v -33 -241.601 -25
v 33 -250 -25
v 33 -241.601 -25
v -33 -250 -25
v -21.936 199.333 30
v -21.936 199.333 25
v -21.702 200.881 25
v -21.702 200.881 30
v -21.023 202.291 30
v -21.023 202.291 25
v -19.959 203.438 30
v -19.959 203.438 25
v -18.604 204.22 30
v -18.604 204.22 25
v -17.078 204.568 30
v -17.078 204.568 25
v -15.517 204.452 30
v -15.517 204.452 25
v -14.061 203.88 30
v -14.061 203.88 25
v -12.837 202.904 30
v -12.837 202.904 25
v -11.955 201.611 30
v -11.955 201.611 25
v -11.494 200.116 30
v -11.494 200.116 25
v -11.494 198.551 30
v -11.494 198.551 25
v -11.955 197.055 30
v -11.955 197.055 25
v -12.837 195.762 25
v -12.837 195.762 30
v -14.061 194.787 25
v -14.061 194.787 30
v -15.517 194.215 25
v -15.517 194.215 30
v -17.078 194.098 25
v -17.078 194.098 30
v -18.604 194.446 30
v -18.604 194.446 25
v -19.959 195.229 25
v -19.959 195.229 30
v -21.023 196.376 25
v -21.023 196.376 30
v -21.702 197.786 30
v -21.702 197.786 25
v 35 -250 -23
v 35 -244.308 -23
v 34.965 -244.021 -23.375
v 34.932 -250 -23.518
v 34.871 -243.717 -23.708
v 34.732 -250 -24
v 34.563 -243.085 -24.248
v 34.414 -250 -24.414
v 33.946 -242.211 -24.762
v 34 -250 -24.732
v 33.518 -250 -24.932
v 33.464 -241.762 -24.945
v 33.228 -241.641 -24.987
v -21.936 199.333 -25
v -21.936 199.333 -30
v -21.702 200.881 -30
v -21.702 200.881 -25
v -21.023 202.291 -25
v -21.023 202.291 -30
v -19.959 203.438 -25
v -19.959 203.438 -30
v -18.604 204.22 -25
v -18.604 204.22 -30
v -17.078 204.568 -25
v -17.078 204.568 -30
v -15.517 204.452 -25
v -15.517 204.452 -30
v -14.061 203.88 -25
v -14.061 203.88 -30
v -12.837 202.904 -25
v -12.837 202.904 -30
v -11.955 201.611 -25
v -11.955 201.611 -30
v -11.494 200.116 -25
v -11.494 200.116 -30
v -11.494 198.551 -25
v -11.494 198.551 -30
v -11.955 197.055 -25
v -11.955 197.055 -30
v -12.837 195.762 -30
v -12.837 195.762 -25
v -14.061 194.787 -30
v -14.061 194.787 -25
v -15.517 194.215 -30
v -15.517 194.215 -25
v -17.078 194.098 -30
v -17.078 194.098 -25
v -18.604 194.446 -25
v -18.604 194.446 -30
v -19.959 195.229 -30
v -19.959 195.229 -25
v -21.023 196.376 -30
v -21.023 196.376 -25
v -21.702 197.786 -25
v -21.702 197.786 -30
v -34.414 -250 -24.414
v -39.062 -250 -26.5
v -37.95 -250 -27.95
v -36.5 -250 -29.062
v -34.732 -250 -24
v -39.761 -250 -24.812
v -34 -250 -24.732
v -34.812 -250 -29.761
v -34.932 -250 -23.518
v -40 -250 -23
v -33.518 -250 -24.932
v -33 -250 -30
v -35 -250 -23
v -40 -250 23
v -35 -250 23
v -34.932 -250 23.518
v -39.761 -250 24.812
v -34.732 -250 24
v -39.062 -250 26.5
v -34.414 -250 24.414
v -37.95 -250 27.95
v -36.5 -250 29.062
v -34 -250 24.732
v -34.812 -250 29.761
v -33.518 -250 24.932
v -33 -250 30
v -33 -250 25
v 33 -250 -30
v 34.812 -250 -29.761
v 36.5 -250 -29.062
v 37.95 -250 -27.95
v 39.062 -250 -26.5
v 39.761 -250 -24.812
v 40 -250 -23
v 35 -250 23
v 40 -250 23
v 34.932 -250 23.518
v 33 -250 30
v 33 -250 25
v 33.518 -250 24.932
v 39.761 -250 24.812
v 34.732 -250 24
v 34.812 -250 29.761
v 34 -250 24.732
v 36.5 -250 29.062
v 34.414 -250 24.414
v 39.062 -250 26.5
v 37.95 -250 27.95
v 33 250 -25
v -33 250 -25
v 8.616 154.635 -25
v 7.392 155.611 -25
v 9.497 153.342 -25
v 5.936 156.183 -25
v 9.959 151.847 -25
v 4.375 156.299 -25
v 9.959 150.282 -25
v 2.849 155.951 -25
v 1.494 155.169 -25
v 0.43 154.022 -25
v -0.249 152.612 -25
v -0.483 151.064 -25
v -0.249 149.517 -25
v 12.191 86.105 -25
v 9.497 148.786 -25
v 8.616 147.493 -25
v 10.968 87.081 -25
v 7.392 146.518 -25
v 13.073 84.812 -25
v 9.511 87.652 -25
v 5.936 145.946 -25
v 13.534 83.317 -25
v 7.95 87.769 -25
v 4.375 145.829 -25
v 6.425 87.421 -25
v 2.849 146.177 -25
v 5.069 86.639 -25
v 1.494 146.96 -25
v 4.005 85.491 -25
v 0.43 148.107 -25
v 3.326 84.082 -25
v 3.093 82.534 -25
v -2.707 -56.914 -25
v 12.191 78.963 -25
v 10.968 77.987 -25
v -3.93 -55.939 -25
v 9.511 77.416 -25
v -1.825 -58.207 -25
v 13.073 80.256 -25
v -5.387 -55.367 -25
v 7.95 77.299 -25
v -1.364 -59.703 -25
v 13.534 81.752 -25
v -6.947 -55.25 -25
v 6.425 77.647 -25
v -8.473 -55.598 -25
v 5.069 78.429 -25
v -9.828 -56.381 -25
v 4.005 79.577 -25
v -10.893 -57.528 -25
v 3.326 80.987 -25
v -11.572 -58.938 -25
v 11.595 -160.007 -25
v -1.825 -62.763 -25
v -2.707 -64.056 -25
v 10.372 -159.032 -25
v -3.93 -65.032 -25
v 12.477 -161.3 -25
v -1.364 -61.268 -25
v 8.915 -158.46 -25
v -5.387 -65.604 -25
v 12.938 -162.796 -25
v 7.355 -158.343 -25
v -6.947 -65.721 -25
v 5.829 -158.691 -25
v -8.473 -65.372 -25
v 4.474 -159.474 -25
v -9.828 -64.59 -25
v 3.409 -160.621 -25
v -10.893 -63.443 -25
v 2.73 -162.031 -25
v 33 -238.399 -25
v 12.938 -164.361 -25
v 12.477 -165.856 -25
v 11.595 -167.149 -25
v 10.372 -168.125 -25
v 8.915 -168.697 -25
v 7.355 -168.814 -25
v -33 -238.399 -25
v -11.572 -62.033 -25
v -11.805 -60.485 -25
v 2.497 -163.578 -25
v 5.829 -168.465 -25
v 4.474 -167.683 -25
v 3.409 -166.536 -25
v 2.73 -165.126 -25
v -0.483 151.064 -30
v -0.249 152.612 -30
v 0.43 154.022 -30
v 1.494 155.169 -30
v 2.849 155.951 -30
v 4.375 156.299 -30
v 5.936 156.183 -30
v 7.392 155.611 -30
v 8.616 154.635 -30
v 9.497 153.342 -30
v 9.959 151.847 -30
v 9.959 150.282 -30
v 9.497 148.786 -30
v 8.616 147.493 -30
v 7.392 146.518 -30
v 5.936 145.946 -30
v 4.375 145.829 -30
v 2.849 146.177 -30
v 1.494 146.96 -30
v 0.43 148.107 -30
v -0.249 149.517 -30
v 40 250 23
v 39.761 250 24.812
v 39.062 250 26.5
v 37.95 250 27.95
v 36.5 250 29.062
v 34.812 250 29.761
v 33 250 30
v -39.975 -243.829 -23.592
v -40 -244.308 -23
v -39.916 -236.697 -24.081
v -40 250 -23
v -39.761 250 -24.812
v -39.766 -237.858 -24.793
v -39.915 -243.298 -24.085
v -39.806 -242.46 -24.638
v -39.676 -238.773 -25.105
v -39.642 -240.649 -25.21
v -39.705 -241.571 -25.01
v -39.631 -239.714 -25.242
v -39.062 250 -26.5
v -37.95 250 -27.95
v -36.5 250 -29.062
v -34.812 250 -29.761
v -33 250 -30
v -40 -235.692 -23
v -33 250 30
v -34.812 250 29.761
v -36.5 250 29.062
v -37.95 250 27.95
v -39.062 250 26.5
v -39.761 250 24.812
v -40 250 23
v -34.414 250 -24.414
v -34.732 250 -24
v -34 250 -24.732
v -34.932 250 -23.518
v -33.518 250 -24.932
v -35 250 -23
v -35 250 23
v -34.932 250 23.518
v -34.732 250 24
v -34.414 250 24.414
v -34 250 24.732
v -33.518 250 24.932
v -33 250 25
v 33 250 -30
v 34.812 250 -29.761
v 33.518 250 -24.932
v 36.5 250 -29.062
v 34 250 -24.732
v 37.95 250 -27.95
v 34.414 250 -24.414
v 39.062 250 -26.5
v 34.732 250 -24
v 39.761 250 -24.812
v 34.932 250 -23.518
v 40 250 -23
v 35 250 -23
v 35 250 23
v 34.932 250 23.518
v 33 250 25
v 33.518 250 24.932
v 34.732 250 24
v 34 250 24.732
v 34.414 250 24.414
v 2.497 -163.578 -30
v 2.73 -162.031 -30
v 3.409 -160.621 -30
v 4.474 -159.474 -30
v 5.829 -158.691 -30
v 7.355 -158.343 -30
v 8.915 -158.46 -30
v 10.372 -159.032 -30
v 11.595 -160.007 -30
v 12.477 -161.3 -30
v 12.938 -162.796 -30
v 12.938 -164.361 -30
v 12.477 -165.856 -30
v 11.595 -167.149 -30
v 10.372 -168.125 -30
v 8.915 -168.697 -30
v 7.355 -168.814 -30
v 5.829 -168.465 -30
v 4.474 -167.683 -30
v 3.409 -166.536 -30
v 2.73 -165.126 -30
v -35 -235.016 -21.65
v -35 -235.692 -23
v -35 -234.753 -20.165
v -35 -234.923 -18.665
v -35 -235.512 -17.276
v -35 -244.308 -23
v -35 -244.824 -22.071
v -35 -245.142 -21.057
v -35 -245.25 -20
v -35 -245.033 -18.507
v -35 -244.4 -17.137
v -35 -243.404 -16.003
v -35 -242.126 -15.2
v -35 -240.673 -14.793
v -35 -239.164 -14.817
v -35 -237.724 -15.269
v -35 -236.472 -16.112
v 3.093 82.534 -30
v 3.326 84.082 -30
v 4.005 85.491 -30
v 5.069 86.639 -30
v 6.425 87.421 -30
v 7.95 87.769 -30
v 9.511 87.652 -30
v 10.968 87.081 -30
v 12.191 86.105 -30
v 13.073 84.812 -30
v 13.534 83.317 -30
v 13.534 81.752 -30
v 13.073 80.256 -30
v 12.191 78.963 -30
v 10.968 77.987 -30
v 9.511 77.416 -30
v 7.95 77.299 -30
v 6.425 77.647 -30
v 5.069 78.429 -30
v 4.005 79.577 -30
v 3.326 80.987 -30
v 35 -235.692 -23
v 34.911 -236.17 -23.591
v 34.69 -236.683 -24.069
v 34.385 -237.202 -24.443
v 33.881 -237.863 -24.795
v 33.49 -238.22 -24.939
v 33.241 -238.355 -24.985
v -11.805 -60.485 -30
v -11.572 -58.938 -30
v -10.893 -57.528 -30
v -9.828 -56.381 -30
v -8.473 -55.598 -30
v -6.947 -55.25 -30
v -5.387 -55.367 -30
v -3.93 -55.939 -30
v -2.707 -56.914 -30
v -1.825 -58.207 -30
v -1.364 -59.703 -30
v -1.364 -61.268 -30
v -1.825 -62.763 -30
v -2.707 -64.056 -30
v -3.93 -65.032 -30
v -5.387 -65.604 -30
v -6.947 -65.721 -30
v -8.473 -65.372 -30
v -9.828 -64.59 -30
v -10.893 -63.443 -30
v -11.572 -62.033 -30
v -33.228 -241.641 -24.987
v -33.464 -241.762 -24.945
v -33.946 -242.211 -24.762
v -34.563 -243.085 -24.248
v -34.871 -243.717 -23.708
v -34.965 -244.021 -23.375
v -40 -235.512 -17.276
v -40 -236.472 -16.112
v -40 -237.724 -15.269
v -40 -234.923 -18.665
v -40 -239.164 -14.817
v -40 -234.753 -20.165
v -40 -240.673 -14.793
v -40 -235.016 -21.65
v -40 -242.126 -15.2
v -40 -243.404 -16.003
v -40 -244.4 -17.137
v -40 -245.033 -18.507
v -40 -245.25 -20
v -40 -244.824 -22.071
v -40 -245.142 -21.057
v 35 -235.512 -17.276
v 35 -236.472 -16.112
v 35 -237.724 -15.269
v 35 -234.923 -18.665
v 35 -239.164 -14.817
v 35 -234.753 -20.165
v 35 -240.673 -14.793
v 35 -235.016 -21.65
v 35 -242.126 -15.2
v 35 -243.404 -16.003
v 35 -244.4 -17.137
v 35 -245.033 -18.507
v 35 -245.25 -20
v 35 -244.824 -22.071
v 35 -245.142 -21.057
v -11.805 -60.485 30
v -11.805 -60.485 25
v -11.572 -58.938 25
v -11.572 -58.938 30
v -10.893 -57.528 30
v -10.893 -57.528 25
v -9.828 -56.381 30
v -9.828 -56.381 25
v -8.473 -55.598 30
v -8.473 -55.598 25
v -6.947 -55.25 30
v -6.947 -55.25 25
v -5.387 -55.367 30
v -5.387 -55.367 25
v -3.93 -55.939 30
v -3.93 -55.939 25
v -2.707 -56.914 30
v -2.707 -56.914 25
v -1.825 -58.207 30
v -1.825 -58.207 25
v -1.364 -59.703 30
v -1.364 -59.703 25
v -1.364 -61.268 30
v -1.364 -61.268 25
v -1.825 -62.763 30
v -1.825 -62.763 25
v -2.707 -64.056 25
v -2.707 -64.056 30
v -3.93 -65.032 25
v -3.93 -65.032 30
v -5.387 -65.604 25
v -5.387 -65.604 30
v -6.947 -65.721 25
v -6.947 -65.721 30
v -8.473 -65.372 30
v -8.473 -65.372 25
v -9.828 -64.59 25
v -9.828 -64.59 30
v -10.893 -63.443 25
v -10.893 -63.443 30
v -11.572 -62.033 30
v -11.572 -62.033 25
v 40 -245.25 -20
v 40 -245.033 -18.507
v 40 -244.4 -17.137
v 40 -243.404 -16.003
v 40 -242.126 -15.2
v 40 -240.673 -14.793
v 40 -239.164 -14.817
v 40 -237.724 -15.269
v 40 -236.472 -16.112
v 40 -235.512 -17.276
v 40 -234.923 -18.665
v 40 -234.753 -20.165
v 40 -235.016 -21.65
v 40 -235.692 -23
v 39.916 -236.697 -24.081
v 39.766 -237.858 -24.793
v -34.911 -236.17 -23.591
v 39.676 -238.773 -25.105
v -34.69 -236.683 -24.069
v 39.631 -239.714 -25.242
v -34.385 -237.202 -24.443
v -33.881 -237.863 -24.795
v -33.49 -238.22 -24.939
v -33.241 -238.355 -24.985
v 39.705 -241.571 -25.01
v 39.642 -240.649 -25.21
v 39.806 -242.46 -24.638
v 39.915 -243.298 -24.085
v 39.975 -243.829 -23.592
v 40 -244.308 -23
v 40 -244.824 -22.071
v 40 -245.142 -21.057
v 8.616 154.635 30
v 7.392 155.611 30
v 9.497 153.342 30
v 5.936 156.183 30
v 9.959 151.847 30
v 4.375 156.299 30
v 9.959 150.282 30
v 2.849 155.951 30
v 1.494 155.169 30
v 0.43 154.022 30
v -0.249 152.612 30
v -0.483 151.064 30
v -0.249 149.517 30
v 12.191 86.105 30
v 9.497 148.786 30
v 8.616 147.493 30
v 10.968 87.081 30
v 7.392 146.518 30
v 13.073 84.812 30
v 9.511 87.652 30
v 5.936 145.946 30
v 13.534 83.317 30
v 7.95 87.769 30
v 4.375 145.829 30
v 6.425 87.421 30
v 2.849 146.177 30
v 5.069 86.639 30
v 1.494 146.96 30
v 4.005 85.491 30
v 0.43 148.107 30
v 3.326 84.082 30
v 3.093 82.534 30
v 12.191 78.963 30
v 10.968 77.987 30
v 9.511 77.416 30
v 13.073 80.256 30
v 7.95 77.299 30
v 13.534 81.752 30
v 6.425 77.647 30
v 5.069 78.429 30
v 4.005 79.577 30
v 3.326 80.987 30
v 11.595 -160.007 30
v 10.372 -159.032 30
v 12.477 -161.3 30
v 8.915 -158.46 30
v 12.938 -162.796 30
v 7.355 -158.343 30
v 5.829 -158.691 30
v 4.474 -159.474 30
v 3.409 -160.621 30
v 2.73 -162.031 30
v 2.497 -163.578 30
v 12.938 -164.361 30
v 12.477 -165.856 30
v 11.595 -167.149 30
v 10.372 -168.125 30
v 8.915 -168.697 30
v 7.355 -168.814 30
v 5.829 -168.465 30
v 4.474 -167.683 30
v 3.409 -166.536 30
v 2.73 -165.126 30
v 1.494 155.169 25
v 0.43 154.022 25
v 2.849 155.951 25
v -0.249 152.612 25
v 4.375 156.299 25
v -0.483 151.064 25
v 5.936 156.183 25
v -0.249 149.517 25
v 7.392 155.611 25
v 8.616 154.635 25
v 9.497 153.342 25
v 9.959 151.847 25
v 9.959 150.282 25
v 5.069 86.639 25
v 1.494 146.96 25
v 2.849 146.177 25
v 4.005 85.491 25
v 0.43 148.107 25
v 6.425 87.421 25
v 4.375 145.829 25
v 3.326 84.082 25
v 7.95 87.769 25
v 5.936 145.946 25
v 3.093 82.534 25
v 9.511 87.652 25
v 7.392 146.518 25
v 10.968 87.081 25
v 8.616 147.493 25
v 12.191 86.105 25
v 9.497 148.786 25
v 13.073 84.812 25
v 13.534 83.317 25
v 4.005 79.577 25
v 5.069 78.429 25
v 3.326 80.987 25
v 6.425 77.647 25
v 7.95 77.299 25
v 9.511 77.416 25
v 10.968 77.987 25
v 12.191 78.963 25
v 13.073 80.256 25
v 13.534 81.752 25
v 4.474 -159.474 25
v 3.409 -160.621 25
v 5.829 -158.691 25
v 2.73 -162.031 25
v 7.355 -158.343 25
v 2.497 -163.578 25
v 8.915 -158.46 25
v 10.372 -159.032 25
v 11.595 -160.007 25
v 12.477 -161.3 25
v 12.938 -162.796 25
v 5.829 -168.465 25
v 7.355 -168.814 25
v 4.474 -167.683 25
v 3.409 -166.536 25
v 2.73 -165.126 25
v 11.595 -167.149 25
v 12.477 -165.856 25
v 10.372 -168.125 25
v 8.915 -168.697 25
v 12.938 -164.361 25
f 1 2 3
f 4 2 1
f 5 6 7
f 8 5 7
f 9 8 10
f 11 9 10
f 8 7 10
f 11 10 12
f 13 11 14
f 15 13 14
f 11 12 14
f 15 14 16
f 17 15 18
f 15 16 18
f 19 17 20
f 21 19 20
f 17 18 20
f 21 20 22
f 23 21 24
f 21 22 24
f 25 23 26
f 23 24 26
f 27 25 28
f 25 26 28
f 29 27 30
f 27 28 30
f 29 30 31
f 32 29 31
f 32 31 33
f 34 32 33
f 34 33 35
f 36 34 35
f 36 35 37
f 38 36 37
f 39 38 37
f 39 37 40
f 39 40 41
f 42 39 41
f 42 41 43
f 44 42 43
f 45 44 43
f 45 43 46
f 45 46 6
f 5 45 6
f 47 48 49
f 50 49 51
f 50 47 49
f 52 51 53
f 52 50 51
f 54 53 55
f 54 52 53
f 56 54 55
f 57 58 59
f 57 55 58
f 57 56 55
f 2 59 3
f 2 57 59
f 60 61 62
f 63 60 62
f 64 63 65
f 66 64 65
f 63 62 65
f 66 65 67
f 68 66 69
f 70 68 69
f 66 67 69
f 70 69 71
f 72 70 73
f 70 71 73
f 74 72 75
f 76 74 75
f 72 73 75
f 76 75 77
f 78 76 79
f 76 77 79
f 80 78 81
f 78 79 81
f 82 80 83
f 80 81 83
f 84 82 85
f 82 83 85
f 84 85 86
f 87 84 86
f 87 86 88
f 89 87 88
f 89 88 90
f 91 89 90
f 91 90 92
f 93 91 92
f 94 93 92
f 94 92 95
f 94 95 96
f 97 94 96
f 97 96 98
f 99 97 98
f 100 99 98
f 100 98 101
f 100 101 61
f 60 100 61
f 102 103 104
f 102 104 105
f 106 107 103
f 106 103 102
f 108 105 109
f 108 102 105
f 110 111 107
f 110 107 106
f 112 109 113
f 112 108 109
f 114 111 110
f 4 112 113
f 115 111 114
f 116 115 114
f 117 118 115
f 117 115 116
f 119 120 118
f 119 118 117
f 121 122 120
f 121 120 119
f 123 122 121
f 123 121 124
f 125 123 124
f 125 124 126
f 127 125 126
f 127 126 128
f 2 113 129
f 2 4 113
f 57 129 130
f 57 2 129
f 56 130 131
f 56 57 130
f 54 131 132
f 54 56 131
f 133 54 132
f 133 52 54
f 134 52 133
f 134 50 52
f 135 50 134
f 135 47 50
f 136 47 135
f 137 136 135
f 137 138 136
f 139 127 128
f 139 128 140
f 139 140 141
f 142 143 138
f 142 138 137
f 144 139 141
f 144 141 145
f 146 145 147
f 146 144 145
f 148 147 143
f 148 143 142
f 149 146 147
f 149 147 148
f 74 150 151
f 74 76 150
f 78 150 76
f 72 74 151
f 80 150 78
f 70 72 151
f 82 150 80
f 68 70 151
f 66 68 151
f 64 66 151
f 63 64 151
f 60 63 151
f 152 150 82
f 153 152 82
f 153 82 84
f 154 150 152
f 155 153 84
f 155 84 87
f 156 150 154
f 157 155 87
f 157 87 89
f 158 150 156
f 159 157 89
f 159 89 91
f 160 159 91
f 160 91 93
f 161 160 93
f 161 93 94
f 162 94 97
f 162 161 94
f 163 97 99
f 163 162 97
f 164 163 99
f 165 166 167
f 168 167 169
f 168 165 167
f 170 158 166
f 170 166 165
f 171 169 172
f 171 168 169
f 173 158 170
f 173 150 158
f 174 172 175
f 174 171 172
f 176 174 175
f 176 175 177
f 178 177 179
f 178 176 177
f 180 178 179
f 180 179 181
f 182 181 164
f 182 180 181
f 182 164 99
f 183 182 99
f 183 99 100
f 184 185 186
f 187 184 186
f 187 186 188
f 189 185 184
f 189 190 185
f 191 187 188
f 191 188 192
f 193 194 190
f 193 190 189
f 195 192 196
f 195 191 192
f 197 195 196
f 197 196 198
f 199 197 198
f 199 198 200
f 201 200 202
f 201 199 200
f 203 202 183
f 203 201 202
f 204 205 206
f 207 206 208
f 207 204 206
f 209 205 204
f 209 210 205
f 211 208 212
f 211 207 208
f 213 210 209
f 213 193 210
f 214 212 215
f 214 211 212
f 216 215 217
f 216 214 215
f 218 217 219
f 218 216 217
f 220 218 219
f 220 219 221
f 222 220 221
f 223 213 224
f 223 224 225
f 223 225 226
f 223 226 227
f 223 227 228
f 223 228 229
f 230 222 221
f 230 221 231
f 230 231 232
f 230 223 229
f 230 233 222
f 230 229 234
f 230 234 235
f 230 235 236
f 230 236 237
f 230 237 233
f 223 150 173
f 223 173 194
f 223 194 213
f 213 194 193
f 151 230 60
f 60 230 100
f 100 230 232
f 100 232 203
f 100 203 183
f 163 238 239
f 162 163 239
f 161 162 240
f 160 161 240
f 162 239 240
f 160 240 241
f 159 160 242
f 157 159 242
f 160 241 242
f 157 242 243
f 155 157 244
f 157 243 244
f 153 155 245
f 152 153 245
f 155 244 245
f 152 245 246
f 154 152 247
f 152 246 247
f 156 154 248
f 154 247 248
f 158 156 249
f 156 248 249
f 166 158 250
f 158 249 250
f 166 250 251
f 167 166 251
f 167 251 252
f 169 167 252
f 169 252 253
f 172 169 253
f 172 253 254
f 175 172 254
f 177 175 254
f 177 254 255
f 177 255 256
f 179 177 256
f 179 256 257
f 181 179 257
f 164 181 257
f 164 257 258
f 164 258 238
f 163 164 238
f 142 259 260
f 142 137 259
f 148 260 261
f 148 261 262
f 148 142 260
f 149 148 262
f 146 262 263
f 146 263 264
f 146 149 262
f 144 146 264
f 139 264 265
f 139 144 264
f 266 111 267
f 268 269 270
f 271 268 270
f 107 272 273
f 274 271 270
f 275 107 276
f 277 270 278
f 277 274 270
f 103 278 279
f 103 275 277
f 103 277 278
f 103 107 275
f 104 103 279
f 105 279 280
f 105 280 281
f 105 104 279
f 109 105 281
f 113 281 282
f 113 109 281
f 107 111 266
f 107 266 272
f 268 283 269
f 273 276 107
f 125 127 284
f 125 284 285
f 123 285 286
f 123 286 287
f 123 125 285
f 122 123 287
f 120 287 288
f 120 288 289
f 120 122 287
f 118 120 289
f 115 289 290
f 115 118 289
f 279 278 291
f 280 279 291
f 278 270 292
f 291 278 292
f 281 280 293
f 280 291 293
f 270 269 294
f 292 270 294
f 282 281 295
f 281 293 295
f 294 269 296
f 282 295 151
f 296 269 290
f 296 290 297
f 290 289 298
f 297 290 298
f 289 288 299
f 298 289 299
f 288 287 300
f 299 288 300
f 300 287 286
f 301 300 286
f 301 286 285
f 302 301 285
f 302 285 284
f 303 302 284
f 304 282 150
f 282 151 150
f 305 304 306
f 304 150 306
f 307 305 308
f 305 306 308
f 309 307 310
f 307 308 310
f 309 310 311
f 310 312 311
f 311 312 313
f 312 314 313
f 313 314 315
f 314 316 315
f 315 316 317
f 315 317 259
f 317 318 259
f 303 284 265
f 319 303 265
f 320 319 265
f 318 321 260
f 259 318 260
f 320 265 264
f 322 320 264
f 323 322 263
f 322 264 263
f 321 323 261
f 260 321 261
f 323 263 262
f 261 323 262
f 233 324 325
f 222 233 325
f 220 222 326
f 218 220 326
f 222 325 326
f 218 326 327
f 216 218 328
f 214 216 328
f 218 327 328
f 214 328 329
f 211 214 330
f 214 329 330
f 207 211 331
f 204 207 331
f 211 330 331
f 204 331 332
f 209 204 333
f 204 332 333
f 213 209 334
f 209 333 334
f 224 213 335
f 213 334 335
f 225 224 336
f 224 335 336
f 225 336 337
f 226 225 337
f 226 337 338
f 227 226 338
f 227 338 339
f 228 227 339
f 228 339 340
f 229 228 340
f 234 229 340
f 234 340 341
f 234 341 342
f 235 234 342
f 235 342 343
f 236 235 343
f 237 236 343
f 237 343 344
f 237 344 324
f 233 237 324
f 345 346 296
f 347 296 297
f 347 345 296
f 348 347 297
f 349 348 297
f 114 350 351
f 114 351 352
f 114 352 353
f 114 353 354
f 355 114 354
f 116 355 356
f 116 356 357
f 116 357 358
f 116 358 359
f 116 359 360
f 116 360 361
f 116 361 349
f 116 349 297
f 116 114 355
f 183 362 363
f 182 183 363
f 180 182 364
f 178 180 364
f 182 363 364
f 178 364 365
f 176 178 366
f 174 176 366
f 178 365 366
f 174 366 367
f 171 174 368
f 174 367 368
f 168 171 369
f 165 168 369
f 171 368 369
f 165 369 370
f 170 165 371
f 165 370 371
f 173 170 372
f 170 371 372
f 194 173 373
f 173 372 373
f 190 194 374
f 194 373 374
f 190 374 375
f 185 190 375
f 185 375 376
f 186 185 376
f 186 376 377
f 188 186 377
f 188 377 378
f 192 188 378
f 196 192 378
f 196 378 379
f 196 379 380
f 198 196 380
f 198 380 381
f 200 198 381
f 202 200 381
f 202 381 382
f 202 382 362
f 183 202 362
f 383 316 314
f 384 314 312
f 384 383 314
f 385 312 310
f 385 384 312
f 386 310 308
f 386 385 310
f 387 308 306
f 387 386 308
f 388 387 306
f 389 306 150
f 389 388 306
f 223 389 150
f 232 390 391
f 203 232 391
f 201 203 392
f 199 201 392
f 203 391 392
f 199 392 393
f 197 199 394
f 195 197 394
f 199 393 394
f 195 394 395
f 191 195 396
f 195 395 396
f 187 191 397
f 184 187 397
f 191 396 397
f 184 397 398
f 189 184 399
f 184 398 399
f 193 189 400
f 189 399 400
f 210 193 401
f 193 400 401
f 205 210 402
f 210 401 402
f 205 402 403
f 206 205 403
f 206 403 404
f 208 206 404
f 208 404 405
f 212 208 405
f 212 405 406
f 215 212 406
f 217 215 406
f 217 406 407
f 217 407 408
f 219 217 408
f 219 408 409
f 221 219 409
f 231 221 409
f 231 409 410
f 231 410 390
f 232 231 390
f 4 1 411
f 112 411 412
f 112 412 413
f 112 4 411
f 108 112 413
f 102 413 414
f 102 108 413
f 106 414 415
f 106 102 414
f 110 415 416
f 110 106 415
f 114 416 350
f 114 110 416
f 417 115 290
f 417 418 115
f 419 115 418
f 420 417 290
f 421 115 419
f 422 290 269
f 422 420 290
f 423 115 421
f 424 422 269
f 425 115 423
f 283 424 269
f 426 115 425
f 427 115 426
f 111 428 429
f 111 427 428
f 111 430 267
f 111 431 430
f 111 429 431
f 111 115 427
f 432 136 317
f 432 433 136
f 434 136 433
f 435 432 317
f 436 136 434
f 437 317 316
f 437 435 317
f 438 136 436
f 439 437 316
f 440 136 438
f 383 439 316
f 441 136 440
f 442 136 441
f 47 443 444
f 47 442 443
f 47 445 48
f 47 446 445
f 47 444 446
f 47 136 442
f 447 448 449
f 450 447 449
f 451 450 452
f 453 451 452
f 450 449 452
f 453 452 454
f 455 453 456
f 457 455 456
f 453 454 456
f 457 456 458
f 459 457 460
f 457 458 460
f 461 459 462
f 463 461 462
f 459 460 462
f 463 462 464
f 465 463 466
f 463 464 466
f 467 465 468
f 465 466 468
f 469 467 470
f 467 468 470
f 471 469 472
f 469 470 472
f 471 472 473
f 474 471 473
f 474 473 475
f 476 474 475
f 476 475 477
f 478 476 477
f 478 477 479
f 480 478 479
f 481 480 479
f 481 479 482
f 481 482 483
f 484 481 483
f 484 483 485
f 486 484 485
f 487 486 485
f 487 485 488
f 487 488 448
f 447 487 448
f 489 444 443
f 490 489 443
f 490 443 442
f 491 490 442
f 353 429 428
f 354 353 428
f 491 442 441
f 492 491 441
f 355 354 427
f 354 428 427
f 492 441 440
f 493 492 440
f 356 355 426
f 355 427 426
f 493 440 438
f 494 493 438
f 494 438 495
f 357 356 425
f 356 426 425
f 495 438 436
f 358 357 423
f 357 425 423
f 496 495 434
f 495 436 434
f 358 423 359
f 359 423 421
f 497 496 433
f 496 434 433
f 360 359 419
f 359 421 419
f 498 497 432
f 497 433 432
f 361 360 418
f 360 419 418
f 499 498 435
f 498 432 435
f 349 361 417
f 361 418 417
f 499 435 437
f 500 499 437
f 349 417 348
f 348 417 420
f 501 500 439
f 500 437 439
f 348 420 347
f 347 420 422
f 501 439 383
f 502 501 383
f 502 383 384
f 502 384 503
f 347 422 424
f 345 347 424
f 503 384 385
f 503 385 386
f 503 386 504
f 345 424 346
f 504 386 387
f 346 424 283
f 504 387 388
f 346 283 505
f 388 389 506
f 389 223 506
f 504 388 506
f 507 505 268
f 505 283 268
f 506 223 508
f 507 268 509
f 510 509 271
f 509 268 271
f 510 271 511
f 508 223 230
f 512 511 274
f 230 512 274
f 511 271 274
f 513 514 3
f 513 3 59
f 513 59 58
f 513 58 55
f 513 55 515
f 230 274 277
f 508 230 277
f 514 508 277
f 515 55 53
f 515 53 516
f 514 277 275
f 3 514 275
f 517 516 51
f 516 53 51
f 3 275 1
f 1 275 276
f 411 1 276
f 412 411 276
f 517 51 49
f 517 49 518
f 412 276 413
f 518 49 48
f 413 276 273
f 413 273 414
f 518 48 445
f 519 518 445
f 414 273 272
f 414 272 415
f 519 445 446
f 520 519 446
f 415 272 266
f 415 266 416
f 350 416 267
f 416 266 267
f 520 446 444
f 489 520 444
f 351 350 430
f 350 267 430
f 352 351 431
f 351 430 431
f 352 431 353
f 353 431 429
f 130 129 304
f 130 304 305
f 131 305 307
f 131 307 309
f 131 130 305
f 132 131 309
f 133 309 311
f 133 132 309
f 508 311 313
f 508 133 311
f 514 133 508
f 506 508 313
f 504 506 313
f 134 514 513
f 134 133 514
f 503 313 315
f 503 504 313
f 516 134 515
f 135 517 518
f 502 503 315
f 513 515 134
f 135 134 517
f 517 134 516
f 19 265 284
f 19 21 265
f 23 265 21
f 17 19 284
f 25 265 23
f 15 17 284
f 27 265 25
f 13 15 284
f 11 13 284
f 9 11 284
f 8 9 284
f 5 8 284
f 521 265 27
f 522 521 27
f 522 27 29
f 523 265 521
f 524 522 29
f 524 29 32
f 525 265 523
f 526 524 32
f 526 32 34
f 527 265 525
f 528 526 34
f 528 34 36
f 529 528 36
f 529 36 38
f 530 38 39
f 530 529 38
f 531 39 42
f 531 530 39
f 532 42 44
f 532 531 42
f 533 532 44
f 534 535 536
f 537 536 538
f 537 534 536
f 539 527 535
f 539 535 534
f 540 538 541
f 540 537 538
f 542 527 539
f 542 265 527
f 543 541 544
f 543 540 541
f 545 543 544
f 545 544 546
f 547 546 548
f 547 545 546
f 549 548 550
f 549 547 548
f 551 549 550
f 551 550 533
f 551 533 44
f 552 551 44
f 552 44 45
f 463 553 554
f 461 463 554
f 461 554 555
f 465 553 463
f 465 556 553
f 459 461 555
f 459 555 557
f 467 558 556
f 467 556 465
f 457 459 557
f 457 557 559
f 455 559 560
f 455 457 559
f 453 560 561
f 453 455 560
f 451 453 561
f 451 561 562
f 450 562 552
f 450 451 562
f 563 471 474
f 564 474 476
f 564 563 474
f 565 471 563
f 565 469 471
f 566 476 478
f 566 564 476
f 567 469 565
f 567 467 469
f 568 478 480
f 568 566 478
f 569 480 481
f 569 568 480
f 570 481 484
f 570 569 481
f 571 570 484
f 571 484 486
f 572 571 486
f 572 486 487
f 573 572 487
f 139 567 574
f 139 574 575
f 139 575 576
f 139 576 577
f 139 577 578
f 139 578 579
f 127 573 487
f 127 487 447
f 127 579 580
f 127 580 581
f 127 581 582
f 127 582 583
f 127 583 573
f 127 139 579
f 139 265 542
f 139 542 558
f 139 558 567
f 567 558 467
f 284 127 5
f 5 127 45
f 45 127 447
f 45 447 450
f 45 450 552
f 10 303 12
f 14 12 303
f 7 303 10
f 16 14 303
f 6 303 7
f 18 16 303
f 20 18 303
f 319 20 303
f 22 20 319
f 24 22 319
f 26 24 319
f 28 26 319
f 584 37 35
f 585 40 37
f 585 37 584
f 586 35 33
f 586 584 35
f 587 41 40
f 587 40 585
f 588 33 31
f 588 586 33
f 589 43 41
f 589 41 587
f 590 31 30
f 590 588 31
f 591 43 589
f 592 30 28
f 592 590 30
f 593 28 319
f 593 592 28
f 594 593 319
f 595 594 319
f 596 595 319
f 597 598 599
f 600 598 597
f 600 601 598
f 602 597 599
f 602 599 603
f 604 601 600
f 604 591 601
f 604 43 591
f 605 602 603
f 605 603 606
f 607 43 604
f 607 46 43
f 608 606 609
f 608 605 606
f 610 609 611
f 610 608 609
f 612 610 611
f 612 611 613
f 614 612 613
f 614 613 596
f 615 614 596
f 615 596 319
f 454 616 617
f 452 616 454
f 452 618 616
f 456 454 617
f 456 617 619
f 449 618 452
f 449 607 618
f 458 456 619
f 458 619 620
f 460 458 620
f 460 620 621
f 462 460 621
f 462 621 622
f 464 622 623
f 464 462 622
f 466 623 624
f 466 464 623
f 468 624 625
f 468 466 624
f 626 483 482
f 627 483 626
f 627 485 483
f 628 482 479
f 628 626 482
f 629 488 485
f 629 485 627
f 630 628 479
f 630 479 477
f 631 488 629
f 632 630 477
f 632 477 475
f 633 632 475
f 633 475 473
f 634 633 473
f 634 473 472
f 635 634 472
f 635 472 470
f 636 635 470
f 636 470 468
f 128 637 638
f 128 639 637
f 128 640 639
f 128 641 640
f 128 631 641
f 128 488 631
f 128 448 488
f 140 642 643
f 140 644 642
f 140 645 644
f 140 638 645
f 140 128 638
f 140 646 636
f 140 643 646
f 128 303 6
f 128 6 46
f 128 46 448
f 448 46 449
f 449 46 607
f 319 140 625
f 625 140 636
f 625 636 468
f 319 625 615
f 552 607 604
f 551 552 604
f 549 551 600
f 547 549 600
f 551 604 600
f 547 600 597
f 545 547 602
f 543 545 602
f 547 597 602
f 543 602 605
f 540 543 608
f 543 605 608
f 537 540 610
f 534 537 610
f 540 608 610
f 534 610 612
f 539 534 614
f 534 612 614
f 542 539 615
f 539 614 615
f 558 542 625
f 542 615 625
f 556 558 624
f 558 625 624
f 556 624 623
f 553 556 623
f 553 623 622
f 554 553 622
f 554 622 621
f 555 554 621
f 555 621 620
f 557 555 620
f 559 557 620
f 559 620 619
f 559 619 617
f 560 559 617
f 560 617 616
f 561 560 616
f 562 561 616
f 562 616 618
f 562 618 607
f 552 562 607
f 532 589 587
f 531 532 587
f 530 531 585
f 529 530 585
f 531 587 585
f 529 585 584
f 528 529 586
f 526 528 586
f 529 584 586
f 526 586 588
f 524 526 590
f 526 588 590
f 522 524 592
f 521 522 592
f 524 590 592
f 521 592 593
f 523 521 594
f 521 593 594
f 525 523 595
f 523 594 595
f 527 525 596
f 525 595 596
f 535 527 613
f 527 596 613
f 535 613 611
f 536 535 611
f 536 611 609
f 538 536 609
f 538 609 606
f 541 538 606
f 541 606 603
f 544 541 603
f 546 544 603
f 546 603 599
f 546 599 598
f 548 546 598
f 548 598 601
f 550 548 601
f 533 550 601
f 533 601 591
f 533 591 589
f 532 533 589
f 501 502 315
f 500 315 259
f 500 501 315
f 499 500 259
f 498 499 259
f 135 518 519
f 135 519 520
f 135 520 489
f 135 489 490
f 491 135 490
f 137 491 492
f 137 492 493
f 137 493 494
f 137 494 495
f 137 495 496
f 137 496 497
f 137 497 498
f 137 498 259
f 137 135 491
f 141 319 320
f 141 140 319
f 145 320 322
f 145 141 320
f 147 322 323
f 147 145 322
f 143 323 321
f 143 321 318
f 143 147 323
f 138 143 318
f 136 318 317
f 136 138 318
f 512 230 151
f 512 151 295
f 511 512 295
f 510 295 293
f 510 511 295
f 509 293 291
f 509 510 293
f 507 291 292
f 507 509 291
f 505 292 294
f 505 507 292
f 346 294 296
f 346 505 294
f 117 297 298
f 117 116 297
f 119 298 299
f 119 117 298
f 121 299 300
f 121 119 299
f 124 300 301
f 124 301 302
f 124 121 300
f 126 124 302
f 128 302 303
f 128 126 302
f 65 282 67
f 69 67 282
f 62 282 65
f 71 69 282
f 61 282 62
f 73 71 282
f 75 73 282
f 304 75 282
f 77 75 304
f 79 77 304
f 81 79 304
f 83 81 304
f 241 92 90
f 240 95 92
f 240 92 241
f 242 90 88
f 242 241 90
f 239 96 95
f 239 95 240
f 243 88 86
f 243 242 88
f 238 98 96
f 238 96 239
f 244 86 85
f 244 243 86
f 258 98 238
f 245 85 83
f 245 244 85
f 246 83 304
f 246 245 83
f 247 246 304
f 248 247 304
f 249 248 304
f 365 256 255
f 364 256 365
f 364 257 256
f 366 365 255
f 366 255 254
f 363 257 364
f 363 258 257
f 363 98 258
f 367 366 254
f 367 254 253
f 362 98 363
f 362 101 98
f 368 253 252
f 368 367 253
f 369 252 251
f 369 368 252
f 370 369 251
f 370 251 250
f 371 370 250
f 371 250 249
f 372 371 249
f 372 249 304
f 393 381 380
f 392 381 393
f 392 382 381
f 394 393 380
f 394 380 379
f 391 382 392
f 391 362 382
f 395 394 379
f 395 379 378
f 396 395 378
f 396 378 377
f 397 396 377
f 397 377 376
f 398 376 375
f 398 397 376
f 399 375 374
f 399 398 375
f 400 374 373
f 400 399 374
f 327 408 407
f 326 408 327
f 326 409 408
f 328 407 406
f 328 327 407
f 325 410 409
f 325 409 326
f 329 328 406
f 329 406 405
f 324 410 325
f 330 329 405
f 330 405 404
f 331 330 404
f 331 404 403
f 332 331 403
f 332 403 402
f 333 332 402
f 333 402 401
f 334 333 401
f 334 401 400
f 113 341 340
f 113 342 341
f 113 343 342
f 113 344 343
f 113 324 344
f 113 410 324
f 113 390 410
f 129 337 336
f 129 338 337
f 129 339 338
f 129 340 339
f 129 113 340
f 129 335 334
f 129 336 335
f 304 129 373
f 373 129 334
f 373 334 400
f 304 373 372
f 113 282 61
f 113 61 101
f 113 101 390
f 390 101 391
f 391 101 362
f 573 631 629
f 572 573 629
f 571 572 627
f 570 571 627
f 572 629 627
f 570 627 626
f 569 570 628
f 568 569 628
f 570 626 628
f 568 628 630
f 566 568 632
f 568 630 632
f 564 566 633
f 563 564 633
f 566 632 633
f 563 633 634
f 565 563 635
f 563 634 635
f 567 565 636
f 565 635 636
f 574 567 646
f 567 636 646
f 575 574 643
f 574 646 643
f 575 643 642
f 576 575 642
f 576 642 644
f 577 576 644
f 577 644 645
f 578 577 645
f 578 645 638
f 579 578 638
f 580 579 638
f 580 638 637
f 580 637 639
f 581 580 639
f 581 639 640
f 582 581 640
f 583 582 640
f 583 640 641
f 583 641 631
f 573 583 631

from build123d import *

# Parameters (mm, degrees)
F1_DEPTH = 250
F4_D     = 10.5
F6_D     = 10.5


with BuildPart() as f1:
    # F0 (on Front) → F1 (new body, symmetric)
    with BuildSketch(Plane.XZ):
        with BuildLine():
            ThreePointArc((40, 23), (37.9497474683, 27.9497474683), (33, 30))
            Line((33, 30), (-33, 30))
            ThreePointArc((-33, 30), (-37.9497474683, 27.9497474683), (-40, 23))
            Line((-40, 23), (-40, -23))
            ThreePointArc((-40, -23), (-37.9497474683, -27.9497474683), (-33, -30))
            Line((-33, -30), (33, -30))
            ThreePointArc((33, -30), (37.9497474683, -27.9497474683), (40, -23))
            Line((40, -23), (40, 23))
        make_face()
        with BuildLine():
            Line((-33, 25), (33, 25))
            ThreePointArc((33, 25), (34.4142135624, 24.4142135624), (35, 23))
            Line((35, 23), (35, -23))
            ThreePointArc((35, -23), (34.4142135624, -24.4142135624), (33, -25))
            Line((33, -25), (-33, -25))
            ThreePointArc((-33, -25), (-34.4142135624, -24.4142135624), (-35, -23))
            Line((-35, -23), (-35, 23))
            ThreePointArc((-35, 23), (-34.4142135624, 24.4142135624), (-33, 25))
        make_face(mode=Mode.SUBTRACT)
    extrude(amount=F1_DEPTH, both=True)

    # F4 (through all)
    with Locations(Plane.XY.offset(30)):
        with Locations((7.7468804084, -163.5783314705), (-6.5550529398, -60.4852437973), (8.3427932113, 82.5340524316), (4.7673056833, 151.0641425848), (-16.68558456, 199.3331462145)):
            Hole(F4_D / 2)

    # F6 (through all)
    with Locations(Plane.YZ.offset(40)):
        with Locations((-240, -20)):
            Hole(F6_D / 2)


solid = f1.part
